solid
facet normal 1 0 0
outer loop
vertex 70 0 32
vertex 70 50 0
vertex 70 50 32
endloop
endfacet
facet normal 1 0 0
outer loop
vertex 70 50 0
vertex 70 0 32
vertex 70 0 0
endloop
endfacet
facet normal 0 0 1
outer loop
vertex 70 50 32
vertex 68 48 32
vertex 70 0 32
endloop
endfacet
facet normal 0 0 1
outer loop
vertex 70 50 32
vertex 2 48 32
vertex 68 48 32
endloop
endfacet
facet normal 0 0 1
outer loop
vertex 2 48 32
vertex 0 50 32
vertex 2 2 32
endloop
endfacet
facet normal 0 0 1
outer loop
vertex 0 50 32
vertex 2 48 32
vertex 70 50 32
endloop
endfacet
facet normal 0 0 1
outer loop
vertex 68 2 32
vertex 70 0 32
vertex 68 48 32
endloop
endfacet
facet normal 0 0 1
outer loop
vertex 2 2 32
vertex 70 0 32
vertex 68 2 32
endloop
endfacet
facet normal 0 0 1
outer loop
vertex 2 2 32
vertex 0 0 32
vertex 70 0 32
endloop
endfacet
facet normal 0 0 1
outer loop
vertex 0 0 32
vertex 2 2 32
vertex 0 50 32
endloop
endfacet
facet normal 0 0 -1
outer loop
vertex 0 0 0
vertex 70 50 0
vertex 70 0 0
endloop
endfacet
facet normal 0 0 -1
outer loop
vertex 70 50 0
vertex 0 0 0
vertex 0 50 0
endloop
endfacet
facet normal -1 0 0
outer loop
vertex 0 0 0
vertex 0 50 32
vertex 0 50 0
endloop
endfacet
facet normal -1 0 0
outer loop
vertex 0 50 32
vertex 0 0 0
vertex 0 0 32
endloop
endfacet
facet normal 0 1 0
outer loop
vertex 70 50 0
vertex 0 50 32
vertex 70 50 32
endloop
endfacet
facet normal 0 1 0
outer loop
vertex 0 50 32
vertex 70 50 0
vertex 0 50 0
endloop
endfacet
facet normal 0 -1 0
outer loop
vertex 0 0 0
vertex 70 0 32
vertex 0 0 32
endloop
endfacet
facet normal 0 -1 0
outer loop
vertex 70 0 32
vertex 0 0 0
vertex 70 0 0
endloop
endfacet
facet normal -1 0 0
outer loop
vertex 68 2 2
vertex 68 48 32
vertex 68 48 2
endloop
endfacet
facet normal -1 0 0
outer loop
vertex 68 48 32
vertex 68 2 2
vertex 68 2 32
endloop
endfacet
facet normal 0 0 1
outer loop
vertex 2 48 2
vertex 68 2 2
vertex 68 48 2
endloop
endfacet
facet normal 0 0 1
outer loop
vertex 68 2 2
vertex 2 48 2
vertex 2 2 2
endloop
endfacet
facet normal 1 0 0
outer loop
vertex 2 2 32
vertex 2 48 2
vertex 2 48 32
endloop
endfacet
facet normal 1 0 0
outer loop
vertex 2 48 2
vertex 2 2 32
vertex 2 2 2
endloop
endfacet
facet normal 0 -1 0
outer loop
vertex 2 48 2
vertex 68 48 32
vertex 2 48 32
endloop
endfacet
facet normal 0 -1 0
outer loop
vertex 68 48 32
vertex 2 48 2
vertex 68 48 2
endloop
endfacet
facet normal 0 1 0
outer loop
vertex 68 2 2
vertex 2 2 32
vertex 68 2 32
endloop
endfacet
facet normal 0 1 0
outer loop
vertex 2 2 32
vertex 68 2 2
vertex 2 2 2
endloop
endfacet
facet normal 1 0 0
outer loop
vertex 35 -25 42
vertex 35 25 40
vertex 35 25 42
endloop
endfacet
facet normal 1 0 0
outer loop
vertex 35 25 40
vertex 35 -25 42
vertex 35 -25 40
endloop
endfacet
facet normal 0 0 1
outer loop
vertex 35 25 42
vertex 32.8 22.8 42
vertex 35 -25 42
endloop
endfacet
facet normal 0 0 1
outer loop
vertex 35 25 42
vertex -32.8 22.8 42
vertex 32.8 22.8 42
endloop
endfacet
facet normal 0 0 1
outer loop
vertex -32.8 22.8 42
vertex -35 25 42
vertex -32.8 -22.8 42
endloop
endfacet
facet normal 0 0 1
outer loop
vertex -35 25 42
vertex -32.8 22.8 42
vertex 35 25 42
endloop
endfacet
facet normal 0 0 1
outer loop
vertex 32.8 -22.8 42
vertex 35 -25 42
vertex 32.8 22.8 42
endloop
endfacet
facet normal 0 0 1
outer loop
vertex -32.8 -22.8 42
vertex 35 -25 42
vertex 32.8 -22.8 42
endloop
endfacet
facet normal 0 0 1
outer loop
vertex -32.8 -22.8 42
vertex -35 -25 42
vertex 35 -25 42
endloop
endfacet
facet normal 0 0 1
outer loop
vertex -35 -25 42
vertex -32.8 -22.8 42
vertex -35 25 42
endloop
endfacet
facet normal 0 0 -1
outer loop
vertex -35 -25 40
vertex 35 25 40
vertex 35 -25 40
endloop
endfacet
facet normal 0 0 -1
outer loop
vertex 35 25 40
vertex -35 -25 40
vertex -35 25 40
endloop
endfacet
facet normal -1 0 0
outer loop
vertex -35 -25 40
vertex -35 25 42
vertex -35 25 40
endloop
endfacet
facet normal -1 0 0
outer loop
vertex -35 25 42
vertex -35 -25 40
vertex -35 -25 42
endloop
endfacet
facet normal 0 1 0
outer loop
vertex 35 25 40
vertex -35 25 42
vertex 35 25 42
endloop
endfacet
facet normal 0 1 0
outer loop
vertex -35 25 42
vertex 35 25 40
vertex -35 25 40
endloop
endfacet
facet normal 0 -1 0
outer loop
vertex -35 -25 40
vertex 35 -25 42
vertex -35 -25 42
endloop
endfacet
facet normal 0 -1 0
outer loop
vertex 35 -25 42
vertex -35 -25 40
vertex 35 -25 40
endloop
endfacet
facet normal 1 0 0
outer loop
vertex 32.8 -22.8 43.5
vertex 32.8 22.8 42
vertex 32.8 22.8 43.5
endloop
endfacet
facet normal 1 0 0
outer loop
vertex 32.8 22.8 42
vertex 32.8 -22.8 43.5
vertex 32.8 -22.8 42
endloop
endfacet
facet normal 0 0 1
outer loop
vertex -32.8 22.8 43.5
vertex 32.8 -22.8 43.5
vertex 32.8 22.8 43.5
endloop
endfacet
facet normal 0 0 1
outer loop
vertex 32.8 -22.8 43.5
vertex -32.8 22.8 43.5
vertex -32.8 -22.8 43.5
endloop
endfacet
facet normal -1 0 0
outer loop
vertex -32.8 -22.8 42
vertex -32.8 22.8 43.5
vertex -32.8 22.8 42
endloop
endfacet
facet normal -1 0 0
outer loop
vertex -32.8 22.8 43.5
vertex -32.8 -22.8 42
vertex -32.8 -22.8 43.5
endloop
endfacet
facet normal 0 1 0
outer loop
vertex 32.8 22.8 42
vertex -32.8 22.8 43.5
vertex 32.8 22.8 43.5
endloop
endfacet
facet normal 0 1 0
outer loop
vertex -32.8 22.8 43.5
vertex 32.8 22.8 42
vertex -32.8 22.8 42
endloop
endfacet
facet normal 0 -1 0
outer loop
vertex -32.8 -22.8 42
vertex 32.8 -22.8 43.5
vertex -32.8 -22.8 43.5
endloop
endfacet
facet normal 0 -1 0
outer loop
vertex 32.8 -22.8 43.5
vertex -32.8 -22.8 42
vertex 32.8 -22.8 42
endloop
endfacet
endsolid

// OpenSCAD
// Two-part enclosure for small electronics board (e.g. Arduino-based logger)
// Print orientation: box on the bed (z = 0), lid on top (+Z), separated by a gap

// ---------------- Parameters ----------------
box_x      = 70;    // box outer length (X)
box_y      = 50;    // box outer width (Y)
box_z      = 30;    // box outer height (Z)
box_wall   = 2;     // box wall thickness (sides and top)
box_floor  = 2;     // box floor thickness

lip_x      = 65.6;  // lip outer length (X)
lip_y      = 45.6;  // lip outer width (Y)
lip_wall   = 1.5;   // lip wall thickness
lip_h      = 4;     // lip height (Z), measured from plate top

plate_x    = 70;    // plate length (X)
plate_y    = 50;    // plate width (Y)
plate_t    = 2;     // plate thickness (Z)

gap        = 10;    // gap between box and lid (Z)

eps        = 0.5;   // cutter overshoot past faces

$fn = 64;

// ---------------- Model ----------------
union() {
    // Part 1: Box, open top
    difference() {
        cube([box_x, box_y, box_z + box_wall]);   // outer block (includes top wall)
        translate([box_wall, box_wall, box_floor])
            cube([box_x - 2*box_wall, box_y - 2*box_wall, box_z + eps]); // open volume
    }

    // Part 2: Lid, printed upside down (lip on top)
    translate([0, 0, box_z + gap]) {
        union() {
            // Base plate
            translate([-plate_x/2, -plate_y/2, 0])
                cube([plate_x, plate_y, plate_t]);

            // Rectangular lip on top of plate
            translate([-lip_x/2, -lip_y/2, plate_t])
                cube([lip_x, lip_y, lip_wall]);
        }
    }
}
